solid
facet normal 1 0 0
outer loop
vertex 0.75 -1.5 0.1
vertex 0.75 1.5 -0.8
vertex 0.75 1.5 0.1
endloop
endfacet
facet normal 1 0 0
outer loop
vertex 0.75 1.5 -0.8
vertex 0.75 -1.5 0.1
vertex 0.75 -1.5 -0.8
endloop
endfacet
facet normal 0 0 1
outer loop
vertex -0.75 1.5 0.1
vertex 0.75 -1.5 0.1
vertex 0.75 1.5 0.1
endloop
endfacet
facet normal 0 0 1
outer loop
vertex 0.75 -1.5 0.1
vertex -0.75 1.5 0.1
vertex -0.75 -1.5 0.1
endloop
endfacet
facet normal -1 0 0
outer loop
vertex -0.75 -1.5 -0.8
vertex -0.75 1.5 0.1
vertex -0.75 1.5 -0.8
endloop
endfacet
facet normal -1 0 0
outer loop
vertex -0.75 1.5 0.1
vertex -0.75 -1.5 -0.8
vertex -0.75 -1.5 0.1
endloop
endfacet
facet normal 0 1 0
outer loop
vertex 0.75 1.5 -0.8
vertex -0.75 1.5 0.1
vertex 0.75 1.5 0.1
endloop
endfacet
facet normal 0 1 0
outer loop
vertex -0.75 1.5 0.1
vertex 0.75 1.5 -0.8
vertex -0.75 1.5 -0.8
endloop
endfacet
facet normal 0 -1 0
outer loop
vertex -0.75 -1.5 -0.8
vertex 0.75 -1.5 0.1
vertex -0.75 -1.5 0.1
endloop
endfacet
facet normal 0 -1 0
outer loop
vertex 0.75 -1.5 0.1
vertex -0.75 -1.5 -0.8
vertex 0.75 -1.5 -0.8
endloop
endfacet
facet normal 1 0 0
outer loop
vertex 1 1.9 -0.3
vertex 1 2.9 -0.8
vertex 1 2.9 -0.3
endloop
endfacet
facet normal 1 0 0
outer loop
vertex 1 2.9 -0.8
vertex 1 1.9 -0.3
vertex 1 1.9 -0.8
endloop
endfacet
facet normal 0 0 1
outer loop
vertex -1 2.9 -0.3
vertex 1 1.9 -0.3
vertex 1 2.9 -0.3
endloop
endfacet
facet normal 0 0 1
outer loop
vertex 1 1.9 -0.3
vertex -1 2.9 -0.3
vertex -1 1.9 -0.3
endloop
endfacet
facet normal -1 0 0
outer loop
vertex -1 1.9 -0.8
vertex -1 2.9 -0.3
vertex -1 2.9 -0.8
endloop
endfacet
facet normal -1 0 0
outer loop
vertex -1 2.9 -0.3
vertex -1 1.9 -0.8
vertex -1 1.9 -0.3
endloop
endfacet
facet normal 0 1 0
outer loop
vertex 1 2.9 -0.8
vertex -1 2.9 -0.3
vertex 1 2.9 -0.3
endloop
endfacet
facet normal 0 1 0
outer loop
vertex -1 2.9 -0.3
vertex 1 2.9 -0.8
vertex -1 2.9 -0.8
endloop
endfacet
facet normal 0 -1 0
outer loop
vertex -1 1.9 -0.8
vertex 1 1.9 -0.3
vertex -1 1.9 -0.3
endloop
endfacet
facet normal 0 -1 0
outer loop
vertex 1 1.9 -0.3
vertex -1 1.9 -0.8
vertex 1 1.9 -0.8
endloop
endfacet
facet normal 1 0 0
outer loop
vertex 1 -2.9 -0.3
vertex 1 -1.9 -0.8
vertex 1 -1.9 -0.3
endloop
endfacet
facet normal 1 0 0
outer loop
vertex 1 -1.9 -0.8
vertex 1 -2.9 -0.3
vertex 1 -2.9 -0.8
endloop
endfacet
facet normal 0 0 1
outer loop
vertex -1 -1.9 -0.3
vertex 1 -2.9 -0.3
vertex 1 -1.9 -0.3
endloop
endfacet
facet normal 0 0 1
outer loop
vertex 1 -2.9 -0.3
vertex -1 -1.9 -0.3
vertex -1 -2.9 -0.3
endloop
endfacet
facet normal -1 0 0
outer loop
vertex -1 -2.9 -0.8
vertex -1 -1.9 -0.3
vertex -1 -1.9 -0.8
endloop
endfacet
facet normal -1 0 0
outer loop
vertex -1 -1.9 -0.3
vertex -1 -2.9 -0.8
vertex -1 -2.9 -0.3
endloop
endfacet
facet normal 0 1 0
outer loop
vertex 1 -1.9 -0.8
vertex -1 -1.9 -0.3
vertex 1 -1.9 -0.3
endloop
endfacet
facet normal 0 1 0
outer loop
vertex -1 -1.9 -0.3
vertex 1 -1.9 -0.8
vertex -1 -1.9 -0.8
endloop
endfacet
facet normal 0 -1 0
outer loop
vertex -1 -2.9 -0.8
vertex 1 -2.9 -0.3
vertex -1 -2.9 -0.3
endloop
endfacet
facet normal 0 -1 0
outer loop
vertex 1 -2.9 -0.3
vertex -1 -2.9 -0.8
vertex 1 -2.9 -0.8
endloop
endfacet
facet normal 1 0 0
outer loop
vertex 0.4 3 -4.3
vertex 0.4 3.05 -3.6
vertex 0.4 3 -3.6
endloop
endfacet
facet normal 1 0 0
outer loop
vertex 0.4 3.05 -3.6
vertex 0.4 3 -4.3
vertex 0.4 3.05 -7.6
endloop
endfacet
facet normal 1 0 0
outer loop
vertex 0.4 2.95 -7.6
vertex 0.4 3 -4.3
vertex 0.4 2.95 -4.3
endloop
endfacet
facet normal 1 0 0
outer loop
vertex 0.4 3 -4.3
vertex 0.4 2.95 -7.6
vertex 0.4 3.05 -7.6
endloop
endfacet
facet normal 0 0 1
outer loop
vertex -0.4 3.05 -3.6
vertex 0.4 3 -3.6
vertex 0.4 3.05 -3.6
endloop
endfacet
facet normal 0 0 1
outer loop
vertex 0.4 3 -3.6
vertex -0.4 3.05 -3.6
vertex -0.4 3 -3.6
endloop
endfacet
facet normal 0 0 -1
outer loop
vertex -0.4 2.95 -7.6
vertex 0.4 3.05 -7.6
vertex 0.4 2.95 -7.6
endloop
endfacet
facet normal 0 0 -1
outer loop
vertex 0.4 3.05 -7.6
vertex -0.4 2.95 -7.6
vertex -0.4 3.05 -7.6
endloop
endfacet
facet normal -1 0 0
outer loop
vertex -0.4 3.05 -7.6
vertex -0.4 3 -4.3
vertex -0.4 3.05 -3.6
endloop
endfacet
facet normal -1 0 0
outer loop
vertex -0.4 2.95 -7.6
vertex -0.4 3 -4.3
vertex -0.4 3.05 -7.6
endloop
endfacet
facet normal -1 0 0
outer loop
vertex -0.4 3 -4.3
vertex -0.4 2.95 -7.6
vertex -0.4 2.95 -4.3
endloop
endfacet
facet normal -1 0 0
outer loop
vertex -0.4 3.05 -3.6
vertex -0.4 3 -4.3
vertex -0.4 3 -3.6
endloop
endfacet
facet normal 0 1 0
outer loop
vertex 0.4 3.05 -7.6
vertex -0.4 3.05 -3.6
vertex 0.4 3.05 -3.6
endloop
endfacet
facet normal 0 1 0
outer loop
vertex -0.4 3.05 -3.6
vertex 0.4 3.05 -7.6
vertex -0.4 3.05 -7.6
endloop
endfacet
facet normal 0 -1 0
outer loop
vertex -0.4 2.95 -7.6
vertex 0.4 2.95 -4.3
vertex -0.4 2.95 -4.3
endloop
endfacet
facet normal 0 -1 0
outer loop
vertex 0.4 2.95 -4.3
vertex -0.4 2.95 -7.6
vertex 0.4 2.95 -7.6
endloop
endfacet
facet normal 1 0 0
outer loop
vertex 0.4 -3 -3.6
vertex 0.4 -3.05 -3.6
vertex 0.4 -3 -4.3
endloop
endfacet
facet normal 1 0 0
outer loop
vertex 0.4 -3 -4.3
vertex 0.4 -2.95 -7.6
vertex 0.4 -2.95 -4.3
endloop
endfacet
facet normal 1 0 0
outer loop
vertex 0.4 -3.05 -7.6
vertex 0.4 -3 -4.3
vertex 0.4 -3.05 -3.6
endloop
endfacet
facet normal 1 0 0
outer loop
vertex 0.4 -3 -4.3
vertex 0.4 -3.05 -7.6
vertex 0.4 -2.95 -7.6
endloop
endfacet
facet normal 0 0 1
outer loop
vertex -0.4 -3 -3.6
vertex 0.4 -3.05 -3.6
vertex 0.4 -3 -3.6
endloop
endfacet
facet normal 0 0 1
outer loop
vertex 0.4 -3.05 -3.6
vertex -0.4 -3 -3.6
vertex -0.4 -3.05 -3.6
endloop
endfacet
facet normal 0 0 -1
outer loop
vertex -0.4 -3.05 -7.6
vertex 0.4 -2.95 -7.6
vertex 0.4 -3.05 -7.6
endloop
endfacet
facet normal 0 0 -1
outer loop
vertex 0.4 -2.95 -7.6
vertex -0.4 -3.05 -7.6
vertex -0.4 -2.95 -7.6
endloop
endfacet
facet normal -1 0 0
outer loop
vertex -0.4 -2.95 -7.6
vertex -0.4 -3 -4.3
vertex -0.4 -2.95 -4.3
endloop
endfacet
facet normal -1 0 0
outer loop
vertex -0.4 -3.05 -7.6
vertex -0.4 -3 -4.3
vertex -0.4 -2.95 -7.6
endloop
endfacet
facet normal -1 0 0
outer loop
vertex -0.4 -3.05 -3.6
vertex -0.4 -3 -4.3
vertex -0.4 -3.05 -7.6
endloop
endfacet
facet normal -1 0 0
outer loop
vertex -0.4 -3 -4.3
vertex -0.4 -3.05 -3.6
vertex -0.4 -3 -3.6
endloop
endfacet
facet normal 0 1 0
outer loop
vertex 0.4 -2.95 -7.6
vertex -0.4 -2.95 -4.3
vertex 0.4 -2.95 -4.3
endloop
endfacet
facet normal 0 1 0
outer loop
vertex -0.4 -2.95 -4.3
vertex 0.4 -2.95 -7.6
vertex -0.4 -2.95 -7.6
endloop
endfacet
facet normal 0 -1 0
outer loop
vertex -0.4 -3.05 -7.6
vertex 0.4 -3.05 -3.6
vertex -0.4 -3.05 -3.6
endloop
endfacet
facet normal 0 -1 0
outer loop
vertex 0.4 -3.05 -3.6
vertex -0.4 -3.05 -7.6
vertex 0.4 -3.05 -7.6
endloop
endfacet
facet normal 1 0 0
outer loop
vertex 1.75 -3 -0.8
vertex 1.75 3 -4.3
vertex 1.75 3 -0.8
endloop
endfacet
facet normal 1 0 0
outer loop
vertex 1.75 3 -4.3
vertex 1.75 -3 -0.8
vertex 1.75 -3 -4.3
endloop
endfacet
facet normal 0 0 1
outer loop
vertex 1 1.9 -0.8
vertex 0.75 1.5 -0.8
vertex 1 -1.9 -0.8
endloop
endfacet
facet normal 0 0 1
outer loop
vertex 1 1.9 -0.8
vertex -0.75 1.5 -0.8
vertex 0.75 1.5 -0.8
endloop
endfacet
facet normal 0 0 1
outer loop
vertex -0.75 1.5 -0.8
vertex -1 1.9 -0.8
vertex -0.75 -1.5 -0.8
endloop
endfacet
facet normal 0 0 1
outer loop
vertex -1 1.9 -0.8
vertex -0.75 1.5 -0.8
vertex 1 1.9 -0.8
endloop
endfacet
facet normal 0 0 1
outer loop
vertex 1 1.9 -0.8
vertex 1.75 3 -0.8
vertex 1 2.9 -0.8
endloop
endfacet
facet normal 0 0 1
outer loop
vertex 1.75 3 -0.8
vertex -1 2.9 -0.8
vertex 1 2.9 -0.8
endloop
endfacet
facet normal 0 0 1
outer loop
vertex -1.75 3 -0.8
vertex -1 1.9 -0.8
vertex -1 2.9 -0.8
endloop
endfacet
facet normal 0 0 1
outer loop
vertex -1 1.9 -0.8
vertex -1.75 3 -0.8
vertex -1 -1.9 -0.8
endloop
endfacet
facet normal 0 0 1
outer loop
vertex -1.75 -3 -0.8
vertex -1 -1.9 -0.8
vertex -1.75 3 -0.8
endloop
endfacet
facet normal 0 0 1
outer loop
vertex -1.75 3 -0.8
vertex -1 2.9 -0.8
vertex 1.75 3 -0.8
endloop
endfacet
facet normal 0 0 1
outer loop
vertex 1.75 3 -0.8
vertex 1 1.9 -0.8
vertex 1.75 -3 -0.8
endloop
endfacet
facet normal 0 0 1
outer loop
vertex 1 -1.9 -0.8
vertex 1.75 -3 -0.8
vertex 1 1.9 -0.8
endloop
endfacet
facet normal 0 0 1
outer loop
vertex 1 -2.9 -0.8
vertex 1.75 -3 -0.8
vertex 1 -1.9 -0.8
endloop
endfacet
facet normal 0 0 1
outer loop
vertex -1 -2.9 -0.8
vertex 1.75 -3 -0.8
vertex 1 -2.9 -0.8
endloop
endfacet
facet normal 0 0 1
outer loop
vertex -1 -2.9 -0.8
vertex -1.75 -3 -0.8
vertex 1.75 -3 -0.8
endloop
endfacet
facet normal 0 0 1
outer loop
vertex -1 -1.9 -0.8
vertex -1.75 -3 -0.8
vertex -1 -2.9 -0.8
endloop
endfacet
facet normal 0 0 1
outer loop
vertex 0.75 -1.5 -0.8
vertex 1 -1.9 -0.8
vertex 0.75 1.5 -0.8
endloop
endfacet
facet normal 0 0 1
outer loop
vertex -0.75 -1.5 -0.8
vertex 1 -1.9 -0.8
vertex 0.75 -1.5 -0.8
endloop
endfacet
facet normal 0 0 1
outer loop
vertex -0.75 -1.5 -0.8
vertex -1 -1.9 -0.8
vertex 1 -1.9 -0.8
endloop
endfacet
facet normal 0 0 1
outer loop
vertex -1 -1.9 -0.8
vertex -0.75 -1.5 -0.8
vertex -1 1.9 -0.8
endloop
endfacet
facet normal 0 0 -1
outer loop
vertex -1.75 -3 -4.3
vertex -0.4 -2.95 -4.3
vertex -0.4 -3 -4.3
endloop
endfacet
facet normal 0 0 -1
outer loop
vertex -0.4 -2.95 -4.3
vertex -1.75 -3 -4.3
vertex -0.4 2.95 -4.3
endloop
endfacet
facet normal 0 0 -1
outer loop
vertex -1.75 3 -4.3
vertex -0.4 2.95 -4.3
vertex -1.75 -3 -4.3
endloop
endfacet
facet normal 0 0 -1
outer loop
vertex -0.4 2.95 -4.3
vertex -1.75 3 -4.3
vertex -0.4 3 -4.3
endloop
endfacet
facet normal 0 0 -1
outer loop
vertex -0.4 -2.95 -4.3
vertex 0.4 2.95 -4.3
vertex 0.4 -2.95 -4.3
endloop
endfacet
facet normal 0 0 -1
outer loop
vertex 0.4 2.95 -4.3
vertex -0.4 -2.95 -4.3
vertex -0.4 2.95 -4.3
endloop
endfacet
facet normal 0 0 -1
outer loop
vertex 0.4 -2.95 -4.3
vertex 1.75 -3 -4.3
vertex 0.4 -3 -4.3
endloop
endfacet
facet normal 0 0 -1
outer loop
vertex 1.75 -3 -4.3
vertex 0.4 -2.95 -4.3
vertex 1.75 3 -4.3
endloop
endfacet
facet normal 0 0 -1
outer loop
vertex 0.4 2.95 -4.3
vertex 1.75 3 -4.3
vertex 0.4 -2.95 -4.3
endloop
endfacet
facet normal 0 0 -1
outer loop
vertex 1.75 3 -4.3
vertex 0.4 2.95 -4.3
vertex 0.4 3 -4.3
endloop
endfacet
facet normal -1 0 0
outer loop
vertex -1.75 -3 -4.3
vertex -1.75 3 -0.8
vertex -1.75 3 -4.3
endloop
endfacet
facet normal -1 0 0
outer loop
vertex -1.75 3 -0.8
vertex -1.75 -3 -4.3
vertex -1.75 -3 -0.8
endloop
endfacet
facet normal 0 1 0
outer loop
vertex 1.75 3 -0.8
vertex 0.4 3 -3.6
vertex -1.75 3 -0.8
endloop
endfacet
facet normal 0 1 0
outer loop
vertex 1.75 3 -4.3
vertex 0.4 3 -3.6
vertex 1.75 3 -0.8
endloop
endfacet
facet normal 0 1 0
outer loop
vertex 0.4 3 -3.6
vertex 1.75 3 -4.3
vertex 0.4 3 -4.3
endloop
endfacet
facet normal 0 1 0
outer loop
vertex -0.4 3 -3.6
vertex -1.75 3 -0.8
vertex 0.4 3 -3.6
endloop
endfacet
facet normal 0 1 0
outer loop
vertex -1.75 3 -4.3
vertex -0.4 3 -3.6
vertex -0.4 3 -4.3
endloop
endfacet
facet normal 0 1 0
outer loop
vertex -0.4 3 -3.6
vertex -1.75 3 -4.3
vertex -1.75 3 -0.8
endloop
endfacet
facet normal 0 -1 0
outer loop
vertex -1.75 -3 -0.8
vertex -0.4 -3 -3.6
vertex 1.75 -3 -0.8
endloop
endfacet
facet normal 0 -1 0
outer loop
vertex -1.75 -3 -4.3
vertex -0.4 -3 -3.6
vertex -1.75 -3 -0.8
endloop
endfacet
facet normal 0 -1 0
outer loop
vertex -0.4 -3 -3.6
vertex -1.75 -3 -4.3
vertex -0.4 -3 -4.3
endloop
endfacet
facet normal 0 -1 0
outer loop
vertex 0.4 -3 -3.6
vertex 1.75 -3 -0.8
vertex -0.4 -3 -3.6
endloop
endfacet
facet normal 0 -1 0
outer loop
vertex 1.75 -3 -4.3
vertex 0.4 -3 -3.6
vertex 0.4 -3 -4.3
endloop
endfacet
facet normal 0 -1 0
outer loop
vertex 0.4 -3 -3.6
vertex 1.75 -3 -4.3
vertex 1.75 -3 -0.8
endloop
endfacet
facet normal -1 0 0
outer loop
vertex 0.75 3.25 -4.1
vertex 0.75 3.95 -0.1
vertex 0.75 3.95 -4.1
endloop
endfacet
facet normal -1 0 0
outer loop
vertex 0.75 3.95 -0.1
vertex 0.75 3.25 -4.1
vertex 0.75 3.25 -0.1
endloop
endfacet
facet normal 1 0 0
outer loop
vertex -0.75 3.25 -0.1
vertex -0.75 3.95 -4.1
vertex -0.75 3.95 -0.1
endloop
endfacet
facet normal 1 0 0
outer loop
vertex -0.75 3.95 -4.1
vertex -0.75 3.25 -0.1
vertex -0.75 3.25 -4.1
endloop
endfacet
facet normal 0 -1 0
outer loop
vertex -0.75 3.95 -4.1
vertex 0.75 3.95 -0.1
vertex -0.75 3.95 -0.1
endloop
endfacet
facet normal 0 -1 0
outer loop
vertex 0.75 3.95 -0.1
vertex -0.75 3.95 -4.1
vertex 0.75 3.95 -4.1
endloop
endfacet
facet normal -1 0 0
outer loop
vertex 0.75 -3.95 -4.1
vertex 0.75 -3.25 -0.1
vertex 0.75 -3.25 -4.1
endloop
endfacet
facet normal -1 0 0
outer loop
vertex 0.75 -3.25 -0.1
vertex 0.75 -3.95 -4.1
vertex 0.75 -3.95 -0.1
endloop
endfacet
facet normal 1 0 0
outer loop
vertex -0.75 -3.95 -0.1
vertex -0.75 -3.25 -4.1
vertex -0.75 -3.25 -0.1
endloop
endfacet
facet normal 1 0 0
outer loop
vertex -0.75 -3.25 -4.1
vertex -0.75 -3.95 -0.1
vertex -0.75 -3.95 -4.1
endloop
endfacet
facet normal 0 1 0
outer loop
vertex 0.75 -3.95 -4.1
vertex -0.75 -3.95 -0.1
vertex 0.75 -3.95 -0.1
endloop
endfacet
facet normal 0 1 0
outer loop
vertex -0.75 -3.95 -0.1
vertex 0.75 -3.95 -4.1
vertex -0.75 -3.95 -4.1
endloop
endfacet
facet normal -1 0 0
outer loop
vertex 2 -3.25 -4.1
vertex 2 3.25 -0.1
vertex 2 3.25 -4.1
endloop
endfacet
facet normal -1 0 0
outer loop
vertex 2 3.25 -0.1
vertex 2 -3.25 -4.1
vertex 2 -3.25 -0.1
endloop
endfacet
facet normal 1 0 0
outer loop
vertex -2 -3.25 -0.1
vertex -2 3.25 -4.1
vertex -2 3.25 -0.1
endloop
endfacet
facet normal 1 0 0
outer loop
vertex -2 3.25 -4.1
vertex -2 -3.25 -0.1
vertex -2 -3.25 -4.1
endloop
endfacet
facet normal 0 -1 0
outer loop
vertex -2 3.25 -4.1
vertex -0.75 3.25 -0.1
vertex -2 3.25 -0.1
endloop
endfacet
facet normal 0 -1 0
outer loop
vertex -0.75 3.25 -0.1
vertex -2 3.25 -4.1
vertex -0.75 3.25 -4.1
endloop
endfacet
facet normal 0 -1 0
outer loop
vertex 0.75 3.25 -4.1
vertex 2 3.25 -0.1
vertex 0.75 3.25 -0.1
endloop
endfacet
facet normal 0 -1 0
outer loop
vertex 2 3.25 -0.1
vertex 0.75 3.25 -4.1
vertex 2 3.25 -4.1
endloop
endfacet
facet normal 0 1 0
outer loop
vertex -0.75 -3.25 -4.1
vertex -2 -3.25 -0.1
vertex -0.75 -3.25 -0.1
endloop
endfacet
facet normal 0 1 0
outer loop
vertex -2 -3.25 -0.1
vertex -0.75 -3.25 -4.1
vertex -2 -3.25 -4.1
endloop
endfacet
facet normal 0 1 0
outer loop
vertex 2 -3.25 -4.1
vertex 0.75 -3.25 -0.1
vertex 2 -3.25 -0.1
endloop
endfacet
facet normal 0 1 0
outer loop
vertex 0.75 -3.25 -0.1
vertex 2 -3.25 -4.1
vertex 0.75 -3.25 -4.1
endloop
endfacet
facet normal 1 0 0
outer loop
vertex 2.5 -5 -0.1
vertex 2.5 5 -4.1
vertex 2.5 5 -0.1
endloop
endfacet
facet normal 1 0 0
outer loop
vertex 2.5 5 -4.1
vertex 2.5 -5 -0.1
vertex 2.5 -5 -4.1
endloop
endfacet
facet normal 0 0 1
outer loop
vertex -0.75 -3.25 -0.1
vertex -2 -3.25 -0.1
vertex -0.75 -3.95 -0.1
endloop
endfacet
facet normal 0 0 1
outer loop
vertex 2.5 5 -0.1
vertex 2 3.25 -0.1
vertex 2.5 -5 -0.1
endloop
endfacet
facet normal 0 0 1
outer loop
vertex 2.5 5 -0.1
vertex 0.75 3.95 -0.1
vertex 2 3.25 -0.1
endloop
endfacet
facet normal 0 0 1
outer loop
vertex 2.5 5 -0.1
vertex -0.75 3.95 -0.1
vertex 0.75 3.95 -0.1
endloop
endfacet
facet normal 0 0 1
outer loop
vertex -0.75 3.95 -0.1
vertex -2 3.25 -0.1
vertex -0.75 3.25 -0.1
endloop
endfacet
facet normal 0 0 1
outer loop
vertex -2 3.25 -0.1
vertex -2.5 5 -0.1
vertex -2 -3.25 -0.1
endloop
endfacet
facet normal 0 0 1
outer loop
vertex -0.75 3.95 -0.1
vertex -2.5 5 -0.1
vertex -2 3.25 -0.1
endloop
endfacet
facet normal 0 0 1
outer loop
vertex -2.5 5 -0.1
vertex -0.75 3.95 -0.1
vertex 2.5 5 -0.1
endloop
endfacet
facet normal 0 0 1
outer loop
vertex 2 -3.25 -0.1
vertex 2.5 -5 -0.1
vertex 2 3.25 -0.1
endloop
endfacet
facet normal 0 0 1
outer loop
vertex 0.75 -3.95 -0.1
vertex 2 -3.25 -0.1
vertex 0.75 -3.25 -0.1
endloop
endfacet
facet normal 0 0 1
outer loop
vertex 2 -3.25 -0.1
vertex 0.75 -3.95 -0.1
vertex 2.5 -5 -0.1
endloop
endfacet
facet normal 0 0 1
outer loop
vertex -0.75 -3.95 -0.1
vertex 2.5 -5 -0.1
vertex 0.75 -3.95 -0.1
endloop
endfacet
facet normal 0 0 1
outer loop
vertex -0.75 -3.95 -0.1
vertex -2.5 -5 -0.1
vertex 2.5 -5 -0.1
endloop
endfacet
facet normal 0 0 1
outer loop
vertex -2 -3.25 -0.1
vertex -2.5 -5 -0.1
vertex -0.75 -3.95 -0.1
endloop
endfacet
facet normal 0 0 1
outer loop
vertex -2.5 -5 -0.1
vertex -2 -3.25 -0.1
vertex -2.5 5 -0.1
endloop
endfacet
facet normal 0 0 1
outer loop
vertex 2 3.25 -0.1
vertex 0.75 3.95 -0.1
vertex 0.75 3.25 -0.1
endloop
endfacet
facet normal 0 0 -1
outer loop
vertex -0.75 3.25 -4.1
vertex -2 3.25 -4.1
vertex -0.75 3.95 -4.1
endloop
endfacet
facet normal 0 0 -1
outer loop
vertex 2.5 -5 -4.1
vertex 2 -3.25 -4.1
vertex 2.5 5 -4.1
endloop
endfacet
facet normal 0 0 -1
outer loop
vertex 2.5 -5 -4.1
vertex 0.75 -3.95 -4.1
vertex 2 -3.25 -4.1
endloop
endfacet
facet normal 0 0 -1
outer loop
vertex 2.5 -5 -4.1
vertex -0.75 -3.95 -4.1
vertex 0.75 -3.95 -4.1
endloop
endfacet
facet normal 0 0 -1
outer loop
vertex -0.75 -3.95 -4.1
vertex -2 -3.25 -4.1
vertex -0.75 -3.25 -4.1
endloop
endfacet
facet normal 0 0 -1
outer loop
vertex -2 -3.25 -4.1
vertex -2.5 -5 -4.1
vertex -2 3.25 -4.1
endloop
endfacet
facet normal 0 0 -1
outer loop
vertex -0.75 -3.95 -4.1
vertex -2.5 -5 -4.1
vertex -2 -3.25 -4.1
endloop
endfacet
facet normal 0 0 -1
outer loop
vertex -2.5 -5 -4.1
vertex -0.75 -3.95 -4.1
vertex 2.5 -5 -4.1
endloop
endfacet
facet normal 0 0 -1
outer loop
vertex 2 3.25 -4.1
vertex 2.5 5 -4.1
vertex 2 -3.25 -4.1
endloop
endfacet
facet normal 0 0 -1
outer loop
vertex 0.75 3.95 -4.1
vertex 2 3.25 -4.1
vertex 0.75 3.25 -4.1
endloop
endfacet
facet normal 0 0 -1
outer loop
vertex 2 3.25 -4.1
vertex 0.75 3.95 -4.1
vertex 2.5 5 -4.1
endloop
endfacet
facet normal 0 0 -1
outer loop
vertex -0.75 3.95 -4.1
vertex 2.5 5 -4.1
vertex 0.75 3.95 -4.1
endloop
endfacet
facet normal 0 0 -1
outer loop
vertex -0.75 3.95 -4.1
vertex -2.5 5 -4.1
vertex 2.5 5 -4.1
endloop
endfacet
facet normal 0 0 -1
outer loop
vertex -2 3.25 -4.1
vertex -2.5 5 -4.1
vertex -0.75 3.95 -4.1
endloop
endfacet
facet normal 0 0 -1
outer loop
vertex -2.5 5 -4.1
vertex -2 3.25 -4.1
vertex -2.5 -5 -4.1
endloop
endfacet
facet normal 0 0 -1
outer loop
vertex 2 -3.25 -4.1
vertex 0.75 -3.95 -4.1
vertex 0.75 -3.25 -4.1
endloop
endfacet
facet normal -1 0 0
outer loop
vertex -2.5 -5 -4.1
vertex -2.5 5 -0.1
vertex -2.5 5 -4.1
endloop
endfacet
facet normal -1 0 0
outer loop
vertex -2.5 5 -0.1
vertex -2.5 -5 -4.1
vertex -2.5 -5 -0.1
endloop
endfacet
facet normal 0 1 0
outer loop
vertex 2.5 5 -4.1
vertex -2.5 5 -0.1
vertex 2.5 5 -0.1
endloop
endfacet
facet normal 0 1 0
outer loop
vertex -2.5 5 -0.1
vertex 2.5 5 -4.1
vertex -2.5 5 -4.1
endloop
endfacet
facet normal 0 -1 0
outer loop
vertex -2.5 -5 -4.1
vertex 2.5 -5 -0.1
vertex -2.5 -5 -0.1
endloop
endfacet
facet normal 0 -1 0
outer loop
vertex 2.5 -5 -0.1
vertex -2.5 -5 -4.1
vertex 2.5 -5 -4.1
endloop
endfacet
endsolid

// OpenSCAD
PushButton2Pin();
difference() {
    translate([0, 0, -2.1]) {
        cube([5, 10, 4], center=true);
    }
    PushButton2Pin(hole=true);
}

function PushButton2PinDepth() = 4.0;
function PushButton2PinTravel() = 0.3;

module PushButton2Pin(hole=false, tolerance=0.25, holeDepth=5) {
    _tolerance = hole? tolerance : 0;
    _holeDepth = hole? holeDepth + 0.8 : 0;
    translate([0, 0, -0.8]) {
        translate([0, 0, -3.5/2 + _holeDepth/2]) {
            color("Gray") {
                cube([3.5+_tolerance*2, 6+_tolerance*2, 3.5 + _holeDepth], center=true);
            }
        }
        if(!hole) {
            color("Black") {
                translate([0, 0, 0.4]) {
                    cube([1.5, 3, 1], center=true);
                }
                translate([0, 2.4, 0]) {
                    cube([2, 1, 1], center=true);
                }
                translate([0, -2.4, 0]) {
                    cube([2, 1, 1], center=true);
                }
            }
            color("White") {
                translate([0, 3, -4.8]) {
                    cube([0.8, 0.1, 4], center=true);
                }
                translate([0, -3, -4.8]) {
                    cube([0.8, 0.1, 4], center=true);
                }
            }
        } else {
            color("White") {
                translate([0, 3.35, (-6.8 + _holeDepth) / 2]) { // leads go down to -6.8 mm
                    cube([1 + _tolerance*2, 0.7 + _tolerance*2, 6.8 + _holeDepth], center=true);
                }
                translate([0, -3.35, (-6.8 + _holeDepth) / 2]) {
                    cube([1 + _tolerance*2, 0.7 + _tolerance*2, 6.8 + _holeDepth], center=true);
                }
            }
        }
    }
}
